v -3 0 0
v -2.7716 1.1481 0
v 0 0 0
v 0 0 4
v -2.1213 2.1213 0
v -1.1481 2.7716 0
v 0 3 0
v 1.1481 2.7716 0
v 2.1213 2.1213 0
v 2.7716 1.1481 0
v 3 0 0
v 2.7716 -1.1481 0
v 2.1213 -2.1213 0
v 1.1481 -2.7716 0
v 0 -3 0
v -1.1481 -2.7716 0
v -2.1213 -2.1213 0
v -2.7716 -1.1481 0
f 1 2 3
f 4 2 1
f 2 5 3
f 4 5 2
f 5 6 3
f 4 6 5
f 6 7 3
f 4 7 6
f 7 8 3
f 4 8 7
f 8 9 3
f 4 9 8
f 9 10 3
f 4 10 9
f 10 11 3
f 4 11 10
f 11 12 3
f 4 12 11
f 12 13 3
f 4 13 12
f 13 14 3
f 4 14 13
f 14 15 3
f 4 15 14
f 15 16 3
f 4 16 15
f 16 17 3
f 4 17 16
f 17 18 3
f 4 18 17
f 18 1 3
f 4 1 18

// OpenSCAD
// profile touching the axis: a cone
rotate_extrude($fn = 16) polygon([[0, 0], [3, 0], [0, 4]]);
